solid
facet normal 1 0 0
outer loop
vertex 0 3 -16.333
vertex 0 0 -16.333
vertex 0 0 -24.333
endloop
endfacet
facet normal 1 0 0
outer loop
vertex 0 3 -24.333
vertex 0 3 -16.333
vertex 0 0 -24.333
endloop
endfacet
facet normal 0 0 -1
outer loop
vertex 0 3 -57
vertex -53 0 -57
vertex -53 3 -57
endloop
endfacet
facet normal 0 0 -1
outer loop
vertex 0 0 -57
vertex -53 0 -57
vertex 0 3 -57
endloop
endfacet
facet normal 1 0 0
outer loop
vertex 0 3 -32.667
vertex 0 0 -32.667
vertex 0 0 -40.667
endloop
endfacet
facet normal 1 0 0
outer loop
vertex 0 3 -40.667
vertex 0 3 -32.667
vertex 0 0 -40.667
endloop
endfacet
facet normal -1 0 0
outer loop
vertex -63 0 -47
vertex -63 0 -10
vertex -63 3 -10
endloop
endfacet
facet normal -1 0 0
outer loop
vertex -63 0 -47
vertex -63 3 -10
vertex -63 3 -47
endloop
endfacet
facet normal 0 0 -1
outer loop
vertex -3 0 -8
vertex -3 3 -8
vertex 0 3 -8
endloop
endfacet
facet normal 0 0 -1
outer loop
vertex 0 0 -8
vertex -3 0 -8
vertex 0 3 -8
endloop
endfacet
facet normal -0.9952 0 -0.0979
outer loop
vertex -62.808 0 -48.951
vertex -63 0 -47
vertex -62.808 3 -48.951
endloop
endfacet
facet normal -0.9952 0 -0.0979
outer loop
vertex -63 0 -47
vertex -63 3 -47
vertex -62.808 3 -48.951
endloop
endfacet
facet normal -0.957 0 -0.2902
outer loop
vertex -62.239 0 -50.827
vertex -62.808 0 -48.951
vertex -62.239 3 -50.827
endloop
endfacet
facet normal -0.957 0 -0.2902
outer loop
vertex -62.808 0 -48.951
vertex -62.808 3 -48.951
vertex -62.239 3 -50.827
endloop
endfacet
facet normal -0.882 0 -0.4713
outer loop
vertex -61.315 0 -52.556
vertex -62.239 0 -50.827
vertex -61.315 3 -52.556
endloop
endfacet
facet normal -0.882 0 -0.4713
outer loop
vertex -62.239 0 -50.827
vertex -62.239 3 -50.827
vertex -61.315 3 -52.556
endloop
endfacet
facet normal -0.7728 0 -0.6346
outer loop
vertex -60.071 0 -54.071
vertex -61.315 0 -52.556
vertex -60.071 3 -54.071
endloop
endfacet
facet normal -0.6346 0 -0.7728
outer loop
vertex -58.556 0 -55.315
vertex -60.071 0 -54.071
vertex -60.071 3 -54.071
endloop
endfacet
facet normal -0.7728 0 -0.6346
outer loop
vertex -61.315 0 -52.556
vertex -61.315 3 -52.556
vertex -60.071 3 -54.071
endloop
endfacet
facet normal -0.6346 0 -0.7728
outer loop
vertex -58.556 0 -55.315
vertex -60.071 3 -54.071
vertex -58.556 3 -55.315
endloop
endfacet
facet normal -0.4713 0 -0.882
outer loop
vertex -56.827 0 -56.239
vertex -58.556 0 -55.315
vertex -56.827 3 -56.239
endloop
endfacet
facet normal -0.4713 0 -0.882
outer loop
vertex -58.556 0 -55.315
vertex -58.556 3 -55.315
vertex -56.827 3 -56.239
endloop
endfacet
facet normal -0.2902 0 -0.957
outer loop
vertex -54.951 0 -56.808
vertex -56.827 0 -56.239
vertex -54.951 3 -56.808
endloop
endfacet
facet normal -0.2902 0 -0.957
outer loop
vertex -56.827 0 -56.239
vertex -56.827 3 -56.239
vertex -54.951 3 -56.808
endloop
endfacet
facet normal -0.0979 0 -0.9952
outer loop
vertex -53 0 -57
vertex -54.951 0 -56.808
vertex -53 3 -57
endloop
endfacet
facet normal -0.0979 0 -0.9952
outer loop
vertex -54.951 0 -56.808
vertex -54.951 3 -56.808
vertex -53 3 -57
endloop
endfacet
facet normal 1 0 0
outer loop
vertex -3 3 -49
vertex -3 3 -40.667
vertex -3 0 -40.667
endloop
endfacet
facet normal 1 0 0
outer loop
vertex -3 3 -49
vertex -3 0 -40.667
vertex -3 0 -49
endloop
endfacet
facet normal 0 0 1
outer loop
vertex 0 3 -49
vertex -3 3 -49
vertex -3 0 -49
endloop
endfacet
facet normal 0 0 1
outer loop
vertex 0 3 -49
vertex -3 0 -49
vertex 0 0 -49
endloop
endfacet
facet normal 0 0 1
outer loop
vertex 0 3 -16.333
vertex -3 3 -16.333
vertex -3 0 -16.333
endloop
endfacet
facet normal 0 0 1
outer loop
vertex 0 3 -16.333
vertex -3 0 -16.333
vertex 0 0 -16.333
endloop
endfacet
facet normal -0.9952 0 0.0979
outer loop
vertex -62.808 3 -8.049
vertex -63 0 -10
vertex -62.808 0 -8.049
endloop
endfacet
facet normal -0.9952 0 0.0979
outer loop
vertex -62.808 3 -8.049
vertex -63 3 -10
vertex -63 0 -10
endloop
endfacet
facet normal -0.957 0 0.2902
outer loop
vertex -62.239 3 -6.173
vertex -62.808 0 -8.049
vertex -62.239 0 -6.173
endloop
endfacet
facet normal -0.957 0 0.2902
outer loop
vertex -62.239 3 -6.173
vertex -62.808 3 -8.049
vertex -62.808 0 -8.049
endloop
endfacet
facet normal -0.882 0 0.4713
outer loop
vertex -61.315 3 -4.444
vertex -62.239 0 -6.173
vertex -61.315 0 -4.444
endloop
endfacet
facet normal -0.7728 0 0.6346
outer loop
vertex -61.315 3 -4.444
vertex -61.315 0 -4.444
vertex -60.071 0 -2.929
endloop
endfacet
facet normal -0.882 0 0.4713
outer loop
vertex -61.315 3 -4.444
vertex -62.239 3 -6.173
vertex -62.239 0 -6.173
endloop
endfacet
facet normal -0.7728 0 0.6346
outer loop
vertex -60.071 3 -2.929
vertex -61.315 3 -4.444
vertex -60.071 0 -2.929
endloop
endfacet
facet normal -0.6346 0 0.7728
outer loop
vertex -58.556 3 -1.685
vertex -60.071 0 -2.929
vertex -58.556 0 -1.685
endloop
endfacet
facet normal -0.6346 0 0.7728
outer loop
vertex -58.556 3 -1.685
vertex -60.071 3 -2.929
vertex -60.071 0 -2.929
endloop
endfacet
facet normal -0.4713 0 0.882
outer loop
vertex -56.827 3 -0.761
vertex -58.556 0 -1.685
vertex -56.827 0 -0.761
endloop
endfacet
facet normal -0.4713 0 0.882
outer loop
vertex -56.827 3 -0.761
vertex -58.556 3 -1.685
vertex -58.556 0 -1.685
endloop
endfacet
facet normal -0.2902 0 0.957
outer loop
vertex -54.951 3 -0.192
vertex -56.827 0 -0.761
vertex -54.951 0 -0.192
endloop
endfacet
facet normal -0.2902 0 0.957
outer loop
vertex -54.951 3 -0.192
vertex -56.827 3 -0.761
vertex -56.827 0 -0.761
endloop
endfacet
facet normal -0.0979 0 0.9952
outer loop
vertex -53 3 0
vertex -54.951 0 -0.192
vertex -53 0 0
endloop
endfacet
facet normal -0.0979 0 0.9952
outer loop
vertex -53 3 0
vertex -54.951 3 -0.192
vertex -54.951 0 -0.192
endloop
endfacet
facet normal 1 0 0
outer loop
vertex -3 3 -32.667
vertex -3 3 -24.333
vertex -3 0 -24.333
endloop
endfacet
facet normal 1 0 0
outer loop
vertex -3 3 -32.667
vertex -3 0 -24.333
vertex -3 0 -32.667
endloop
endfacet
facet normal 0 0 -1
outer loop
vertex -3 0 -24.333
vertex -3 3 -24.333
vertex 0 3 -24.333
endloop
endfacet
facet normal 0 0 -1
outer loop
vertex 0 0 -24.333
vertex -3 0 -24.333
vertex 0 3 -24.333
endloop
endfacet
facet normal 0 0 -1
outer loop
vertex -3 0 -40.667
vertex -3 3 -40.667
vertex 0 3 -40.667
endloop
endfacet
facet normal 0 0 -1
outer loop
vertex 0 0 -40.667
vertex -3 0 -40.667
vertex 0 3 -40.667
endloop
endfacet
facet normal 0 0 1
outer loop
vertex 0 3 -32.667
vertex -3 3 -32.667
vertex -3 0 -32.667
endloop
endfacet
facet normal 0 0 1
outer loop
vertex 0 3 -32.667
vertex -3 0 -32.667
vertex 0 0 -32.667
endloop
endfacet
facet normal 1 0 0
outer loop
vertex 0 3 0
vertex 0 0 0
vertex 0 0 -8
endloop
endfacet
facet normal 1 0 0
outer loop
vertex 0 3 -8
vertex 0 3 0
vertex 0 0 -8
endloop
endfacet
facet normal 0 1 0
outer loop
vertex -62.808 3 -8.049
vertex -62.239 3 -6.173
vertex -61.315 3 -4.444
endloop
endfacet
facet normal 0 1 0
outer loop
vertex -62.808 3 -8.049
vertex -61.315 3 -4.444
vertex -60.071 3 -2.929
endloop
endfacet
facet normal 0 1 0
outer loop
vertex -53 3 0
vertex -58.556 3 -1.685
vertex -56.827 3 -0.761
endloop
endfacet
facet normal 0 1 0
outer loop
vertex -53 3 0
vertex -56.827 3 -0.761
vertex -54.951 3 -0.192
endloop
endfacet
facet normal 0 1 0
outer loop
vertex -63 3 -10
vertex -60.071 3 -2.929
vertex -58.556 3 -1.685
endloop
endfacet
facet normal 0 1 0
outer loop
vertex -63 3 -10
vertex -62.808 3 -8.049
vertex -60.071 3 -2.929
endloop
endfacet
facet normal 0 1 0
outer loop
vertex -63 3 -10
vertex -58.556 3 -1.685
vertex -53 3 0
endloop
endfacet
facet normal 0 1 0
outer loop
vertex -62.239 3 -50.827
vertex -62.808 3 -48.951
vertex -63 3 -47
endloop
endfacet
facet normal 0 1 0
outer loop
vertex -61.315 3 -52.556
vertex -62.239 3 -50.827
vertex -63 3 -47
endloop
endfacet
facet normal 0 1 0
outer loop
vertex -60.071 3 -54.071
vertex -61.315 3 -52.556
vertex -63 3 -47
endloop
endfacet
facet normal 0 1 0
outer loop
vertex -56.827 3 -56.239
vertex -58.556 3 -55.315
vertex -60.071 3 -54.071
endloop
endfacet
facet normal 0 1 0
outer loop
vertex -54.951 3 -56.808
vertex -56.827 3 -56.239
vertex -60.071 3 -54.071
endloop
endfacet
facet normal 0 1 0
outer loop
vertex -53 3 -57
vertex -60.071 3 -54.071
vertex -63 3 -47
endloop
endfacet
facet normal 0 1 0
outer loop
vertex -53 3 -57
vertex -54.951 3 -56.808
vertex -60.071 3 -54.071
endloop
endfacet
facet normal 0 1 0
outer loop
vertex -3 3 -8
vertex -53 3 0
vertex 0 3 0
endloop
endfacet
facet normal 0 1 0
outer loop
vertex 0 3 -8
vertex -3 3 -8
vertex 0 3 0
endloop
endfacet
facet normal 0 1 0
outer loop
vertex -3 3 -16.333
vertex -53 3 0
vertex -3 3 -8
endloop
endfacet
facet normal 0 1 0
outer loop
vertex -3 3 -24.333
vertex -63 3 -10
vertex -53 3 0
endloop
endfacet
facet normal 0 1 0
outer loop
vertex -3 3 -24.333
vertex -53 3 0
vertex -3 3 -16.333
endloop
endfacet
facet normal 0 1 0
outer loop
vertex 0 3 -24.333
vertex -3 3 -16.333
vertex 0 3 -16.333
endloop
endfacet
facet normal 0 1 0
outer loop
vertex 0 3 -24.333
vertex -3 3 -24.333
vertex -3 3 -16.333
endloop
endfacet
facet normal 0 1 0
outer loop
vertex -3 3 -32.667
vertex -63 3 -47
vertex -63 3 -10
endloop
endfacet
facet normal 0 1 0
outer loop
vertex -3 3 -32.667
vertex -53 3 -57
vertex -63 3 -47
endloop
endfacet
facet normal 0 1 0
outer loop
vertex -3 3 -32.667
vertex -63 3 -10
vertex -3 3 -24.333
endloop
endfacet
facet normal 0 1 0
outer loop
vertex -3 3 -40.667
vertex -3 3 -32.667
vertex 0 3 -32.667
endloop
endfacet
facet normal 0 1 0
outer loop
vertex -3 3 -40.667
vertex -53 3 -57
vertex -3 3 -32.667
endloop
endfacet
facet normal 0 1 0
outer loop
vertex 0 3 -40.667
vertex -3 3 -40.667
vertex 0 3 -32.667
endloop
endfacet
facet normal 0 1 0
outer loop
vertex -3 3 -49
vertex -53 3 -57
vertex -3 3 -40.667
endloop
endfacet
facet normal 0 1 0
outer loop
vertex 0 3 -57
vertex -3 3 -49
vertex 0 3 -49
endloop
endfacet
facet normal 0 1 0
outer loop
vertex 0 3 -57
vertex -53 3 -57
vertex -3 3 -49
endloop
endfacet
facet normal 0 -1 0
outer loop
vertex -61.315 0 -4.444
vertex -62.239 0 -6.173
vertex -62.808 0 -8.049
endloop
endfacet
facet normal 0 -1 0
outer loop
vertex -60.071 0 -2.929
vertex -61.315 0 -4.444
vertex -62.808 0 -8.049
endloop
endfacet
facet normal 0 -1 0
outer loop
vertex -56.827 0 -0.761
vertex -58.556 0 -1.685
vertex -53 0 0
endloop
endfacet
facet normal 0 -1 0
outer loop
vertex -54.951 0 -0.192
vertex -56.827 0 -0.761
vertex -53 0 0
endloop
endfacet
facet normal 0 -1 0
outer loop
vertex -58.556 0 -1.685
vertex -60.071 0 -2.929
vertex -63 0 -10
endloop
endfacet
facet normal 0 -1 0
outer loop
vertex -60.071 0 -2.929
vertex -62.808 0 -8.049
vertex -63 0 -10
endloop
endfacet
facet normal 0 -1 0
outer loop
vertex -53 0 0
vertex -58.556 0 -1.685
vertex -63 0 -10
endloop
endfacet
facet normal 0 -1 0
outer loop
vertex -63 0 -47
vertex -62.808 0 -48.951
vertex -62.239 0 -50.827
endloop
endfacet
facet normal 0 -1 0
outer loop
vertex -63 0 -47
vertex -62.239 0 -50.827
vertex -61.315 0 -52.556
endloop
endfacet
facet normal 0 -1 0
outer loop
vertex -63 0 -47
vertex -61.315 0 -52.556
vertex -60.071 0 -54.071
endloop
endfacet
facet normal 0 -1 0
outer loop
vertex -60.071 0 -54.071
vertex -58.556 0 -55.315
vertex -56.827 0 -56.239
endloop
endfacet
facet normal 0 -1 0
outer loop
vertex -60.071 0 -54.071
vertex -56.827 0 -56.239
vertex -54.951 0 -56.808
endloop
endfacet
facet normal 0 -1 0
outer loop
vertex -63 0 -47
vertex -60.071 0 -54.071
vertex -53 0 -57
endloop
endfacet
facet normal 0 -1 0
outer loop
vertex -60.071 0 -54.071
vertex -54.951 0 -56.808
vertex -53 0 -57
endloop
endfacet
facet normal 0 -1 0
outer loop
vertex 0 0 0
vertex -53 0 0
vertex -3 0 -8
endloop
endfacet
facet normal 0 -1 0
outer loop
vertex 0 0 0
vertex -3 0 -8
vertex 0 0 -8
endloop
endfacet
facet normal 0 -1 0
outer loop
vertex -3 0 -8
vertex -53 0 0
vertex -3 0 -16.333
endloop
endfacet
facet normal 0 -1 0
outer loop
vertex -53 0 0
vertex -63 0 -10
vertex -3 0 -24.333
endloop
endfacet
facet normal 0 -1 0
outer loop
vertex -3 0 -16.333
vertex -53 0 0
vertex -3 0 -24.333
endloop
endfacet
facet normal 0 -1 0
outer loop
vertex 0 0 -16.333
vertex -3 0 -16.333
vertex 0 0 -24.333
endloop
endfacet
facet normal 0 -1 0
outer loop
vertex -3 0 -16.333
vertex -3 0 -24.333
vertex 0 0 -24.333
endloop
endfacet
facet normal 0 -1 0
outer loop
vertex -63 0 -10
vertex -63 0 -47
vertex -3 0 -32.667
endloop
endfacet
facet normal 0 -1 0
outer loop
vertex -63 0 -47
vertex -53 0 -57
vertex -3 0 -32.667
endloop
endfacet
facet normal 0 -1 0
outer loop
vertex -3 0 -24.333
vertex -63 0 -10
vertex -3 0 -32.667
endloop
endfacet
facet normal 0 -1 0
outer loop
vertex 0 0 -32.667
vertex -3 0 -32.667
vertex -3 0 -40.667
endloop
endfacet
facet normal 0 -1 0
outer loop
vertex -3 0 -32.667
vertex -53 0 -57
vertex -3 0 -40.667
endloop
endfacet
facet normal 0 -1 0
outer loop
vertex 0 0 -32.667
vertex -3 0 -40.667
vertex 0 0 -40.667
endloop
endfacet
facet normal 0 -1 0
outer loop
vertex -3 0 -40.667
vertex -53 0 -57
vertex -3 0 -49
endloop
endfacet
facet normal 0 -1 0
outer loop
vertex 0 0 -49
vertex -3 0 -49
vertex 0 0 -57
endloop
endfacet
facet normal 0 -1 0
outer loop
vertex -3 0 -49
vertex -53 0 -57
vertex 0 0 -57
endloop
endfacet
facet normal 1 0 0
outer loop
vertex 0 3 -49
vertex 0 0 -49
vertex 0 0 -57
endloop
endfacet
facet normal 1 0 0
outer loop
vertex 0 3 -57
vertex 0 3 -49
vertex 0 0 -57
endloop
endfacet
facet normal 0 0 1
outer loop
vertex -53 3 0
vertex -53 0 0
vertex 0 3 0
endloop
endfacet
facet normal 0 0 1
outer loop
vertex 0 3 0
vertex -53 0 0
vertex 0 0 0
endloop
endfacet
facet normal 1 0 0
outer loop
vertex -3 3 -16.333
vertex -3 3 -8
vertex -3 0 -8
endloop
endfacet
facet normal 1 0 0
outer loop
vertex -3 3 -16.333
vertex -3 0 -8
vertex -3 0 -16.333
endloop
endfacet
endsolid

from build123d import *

# Parameters (mm, degrees)
ESQUISSE1_W             = 63
ESQUISSE1_H             = 57
BOSS_EXTRU_1_DEPTH      = 3
ESQUISSE2_W             = 3
ESQUISSE2_H             = 8.333333333
ESQUISSE2_H_2           = 8.333333334
ENL_V_MAT_EXTRU_1_DEPTH = 3
CONG_1_R                = 10


with BuildPart() as part:
    # Esquisse1 → Boss.-Extru.1 (new body)
    with BuildSketch(Plane(origin=(0, 0, 0), x_dir=(1, 0, 0), z_dir=(0, 1, 0))):
        with Locations((-31.5, 28.5)):
            Rectangle(ESQUISSE1_W, ESQUISSE1_H)
    extrude(amount=BOSS_EXTRU_1_DEPTH)

    # Esquisse2 → Enlèv. mat.-Extru.1 (cut)
    with BuildSketch(Plane(origin=(0, 3, 0), x_dir=(1, 0, 0), z_dir=(0, 1, 0))):
        with Locations((-1.5, 12.166666667)):
            Rectangle(ESQUISSE2_W, ESQUISSE2_H)
        with Locations((-1.5, 28.5)):
            Rectangle(ESQUISSE2_W, ESQUISSE2_H_2)
        with Locations((-1.5, 44.833333334)):
            Rectangle(ESQUISSE2_W, ESQUISSE2_H)
    extrude(amount=-ENL_V_MAT_EXTRU_1_DEPTH, mode=Mode.SUBTRACT)

    # Congé1
    cong_1_edges = [part.edges().sort_by_distance(p)[0] for p in [
        (-63, 1.5, 0),
        (-63, 1.5, -57),
    ]]
    fillet(cong_1_edges, radius=CONG_1_R)


solid = part.part
